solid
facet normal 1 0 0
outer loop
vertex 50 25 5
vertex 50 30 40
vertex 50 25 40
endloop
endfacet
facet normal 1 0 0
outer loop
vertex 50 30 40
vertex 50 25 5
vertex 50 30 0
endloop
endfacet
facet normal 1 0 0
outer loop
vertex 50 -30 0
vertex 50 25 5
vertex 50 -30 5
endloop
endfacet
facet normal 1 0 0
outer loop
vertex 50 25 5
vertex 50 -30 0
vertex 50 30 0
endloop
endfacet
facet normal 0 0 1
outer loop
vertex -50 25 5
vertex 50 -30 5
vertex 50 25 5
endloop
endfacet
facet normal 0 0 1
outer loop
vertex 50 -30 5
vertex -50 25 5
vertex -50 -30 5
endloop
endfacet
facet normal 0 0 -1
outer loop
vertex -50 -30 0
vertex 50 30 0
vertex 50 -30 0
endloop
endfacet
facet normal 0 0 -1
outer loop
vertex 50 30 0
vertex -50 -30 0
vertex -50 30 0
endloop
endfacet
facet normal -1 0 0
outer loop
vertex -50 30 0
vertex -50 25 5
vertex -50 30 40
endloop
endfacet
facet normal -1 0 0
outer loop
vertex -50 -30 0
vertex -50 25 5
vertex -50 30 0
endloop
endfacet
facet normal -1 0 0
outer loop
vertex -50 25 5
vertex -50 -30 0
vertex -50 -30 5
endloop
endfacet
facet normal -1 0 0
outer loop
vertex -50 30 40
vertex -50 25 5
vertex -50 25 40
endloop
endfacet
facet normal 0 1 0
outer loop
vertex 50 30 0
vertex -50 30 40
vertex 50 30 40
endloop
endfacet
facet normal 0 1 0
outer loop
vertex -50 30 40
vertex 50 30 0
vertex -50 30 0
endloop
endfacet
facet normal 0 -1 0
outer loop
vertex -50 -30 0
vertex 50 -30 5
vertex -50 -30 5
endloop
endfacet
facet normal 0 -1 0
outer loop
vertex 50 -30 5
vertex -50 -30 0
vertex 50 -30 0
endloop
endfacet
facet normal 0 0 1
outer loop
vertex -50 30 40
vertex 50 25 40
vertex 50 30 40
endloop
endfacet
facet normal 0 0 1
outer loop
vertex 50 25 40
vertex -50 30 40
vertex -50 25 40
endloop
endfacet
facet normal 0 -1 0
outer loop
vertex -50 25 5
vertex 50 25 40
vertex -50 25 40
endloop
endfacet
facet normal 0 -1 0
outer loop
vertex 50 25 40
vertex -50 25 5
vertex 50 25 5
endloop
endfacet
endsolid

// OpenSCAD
// Generated with SolidPython2 for OpenSCAD task-038
$fn = 64;

union() {
	translate(v = [-50.0, -30.0, 0]) {
		cube(size = [100, 60, 5]);
	}
	translate(v = [-50, 25, 5]) {
		cube(size = [100, 5, 35]);
	}
}
